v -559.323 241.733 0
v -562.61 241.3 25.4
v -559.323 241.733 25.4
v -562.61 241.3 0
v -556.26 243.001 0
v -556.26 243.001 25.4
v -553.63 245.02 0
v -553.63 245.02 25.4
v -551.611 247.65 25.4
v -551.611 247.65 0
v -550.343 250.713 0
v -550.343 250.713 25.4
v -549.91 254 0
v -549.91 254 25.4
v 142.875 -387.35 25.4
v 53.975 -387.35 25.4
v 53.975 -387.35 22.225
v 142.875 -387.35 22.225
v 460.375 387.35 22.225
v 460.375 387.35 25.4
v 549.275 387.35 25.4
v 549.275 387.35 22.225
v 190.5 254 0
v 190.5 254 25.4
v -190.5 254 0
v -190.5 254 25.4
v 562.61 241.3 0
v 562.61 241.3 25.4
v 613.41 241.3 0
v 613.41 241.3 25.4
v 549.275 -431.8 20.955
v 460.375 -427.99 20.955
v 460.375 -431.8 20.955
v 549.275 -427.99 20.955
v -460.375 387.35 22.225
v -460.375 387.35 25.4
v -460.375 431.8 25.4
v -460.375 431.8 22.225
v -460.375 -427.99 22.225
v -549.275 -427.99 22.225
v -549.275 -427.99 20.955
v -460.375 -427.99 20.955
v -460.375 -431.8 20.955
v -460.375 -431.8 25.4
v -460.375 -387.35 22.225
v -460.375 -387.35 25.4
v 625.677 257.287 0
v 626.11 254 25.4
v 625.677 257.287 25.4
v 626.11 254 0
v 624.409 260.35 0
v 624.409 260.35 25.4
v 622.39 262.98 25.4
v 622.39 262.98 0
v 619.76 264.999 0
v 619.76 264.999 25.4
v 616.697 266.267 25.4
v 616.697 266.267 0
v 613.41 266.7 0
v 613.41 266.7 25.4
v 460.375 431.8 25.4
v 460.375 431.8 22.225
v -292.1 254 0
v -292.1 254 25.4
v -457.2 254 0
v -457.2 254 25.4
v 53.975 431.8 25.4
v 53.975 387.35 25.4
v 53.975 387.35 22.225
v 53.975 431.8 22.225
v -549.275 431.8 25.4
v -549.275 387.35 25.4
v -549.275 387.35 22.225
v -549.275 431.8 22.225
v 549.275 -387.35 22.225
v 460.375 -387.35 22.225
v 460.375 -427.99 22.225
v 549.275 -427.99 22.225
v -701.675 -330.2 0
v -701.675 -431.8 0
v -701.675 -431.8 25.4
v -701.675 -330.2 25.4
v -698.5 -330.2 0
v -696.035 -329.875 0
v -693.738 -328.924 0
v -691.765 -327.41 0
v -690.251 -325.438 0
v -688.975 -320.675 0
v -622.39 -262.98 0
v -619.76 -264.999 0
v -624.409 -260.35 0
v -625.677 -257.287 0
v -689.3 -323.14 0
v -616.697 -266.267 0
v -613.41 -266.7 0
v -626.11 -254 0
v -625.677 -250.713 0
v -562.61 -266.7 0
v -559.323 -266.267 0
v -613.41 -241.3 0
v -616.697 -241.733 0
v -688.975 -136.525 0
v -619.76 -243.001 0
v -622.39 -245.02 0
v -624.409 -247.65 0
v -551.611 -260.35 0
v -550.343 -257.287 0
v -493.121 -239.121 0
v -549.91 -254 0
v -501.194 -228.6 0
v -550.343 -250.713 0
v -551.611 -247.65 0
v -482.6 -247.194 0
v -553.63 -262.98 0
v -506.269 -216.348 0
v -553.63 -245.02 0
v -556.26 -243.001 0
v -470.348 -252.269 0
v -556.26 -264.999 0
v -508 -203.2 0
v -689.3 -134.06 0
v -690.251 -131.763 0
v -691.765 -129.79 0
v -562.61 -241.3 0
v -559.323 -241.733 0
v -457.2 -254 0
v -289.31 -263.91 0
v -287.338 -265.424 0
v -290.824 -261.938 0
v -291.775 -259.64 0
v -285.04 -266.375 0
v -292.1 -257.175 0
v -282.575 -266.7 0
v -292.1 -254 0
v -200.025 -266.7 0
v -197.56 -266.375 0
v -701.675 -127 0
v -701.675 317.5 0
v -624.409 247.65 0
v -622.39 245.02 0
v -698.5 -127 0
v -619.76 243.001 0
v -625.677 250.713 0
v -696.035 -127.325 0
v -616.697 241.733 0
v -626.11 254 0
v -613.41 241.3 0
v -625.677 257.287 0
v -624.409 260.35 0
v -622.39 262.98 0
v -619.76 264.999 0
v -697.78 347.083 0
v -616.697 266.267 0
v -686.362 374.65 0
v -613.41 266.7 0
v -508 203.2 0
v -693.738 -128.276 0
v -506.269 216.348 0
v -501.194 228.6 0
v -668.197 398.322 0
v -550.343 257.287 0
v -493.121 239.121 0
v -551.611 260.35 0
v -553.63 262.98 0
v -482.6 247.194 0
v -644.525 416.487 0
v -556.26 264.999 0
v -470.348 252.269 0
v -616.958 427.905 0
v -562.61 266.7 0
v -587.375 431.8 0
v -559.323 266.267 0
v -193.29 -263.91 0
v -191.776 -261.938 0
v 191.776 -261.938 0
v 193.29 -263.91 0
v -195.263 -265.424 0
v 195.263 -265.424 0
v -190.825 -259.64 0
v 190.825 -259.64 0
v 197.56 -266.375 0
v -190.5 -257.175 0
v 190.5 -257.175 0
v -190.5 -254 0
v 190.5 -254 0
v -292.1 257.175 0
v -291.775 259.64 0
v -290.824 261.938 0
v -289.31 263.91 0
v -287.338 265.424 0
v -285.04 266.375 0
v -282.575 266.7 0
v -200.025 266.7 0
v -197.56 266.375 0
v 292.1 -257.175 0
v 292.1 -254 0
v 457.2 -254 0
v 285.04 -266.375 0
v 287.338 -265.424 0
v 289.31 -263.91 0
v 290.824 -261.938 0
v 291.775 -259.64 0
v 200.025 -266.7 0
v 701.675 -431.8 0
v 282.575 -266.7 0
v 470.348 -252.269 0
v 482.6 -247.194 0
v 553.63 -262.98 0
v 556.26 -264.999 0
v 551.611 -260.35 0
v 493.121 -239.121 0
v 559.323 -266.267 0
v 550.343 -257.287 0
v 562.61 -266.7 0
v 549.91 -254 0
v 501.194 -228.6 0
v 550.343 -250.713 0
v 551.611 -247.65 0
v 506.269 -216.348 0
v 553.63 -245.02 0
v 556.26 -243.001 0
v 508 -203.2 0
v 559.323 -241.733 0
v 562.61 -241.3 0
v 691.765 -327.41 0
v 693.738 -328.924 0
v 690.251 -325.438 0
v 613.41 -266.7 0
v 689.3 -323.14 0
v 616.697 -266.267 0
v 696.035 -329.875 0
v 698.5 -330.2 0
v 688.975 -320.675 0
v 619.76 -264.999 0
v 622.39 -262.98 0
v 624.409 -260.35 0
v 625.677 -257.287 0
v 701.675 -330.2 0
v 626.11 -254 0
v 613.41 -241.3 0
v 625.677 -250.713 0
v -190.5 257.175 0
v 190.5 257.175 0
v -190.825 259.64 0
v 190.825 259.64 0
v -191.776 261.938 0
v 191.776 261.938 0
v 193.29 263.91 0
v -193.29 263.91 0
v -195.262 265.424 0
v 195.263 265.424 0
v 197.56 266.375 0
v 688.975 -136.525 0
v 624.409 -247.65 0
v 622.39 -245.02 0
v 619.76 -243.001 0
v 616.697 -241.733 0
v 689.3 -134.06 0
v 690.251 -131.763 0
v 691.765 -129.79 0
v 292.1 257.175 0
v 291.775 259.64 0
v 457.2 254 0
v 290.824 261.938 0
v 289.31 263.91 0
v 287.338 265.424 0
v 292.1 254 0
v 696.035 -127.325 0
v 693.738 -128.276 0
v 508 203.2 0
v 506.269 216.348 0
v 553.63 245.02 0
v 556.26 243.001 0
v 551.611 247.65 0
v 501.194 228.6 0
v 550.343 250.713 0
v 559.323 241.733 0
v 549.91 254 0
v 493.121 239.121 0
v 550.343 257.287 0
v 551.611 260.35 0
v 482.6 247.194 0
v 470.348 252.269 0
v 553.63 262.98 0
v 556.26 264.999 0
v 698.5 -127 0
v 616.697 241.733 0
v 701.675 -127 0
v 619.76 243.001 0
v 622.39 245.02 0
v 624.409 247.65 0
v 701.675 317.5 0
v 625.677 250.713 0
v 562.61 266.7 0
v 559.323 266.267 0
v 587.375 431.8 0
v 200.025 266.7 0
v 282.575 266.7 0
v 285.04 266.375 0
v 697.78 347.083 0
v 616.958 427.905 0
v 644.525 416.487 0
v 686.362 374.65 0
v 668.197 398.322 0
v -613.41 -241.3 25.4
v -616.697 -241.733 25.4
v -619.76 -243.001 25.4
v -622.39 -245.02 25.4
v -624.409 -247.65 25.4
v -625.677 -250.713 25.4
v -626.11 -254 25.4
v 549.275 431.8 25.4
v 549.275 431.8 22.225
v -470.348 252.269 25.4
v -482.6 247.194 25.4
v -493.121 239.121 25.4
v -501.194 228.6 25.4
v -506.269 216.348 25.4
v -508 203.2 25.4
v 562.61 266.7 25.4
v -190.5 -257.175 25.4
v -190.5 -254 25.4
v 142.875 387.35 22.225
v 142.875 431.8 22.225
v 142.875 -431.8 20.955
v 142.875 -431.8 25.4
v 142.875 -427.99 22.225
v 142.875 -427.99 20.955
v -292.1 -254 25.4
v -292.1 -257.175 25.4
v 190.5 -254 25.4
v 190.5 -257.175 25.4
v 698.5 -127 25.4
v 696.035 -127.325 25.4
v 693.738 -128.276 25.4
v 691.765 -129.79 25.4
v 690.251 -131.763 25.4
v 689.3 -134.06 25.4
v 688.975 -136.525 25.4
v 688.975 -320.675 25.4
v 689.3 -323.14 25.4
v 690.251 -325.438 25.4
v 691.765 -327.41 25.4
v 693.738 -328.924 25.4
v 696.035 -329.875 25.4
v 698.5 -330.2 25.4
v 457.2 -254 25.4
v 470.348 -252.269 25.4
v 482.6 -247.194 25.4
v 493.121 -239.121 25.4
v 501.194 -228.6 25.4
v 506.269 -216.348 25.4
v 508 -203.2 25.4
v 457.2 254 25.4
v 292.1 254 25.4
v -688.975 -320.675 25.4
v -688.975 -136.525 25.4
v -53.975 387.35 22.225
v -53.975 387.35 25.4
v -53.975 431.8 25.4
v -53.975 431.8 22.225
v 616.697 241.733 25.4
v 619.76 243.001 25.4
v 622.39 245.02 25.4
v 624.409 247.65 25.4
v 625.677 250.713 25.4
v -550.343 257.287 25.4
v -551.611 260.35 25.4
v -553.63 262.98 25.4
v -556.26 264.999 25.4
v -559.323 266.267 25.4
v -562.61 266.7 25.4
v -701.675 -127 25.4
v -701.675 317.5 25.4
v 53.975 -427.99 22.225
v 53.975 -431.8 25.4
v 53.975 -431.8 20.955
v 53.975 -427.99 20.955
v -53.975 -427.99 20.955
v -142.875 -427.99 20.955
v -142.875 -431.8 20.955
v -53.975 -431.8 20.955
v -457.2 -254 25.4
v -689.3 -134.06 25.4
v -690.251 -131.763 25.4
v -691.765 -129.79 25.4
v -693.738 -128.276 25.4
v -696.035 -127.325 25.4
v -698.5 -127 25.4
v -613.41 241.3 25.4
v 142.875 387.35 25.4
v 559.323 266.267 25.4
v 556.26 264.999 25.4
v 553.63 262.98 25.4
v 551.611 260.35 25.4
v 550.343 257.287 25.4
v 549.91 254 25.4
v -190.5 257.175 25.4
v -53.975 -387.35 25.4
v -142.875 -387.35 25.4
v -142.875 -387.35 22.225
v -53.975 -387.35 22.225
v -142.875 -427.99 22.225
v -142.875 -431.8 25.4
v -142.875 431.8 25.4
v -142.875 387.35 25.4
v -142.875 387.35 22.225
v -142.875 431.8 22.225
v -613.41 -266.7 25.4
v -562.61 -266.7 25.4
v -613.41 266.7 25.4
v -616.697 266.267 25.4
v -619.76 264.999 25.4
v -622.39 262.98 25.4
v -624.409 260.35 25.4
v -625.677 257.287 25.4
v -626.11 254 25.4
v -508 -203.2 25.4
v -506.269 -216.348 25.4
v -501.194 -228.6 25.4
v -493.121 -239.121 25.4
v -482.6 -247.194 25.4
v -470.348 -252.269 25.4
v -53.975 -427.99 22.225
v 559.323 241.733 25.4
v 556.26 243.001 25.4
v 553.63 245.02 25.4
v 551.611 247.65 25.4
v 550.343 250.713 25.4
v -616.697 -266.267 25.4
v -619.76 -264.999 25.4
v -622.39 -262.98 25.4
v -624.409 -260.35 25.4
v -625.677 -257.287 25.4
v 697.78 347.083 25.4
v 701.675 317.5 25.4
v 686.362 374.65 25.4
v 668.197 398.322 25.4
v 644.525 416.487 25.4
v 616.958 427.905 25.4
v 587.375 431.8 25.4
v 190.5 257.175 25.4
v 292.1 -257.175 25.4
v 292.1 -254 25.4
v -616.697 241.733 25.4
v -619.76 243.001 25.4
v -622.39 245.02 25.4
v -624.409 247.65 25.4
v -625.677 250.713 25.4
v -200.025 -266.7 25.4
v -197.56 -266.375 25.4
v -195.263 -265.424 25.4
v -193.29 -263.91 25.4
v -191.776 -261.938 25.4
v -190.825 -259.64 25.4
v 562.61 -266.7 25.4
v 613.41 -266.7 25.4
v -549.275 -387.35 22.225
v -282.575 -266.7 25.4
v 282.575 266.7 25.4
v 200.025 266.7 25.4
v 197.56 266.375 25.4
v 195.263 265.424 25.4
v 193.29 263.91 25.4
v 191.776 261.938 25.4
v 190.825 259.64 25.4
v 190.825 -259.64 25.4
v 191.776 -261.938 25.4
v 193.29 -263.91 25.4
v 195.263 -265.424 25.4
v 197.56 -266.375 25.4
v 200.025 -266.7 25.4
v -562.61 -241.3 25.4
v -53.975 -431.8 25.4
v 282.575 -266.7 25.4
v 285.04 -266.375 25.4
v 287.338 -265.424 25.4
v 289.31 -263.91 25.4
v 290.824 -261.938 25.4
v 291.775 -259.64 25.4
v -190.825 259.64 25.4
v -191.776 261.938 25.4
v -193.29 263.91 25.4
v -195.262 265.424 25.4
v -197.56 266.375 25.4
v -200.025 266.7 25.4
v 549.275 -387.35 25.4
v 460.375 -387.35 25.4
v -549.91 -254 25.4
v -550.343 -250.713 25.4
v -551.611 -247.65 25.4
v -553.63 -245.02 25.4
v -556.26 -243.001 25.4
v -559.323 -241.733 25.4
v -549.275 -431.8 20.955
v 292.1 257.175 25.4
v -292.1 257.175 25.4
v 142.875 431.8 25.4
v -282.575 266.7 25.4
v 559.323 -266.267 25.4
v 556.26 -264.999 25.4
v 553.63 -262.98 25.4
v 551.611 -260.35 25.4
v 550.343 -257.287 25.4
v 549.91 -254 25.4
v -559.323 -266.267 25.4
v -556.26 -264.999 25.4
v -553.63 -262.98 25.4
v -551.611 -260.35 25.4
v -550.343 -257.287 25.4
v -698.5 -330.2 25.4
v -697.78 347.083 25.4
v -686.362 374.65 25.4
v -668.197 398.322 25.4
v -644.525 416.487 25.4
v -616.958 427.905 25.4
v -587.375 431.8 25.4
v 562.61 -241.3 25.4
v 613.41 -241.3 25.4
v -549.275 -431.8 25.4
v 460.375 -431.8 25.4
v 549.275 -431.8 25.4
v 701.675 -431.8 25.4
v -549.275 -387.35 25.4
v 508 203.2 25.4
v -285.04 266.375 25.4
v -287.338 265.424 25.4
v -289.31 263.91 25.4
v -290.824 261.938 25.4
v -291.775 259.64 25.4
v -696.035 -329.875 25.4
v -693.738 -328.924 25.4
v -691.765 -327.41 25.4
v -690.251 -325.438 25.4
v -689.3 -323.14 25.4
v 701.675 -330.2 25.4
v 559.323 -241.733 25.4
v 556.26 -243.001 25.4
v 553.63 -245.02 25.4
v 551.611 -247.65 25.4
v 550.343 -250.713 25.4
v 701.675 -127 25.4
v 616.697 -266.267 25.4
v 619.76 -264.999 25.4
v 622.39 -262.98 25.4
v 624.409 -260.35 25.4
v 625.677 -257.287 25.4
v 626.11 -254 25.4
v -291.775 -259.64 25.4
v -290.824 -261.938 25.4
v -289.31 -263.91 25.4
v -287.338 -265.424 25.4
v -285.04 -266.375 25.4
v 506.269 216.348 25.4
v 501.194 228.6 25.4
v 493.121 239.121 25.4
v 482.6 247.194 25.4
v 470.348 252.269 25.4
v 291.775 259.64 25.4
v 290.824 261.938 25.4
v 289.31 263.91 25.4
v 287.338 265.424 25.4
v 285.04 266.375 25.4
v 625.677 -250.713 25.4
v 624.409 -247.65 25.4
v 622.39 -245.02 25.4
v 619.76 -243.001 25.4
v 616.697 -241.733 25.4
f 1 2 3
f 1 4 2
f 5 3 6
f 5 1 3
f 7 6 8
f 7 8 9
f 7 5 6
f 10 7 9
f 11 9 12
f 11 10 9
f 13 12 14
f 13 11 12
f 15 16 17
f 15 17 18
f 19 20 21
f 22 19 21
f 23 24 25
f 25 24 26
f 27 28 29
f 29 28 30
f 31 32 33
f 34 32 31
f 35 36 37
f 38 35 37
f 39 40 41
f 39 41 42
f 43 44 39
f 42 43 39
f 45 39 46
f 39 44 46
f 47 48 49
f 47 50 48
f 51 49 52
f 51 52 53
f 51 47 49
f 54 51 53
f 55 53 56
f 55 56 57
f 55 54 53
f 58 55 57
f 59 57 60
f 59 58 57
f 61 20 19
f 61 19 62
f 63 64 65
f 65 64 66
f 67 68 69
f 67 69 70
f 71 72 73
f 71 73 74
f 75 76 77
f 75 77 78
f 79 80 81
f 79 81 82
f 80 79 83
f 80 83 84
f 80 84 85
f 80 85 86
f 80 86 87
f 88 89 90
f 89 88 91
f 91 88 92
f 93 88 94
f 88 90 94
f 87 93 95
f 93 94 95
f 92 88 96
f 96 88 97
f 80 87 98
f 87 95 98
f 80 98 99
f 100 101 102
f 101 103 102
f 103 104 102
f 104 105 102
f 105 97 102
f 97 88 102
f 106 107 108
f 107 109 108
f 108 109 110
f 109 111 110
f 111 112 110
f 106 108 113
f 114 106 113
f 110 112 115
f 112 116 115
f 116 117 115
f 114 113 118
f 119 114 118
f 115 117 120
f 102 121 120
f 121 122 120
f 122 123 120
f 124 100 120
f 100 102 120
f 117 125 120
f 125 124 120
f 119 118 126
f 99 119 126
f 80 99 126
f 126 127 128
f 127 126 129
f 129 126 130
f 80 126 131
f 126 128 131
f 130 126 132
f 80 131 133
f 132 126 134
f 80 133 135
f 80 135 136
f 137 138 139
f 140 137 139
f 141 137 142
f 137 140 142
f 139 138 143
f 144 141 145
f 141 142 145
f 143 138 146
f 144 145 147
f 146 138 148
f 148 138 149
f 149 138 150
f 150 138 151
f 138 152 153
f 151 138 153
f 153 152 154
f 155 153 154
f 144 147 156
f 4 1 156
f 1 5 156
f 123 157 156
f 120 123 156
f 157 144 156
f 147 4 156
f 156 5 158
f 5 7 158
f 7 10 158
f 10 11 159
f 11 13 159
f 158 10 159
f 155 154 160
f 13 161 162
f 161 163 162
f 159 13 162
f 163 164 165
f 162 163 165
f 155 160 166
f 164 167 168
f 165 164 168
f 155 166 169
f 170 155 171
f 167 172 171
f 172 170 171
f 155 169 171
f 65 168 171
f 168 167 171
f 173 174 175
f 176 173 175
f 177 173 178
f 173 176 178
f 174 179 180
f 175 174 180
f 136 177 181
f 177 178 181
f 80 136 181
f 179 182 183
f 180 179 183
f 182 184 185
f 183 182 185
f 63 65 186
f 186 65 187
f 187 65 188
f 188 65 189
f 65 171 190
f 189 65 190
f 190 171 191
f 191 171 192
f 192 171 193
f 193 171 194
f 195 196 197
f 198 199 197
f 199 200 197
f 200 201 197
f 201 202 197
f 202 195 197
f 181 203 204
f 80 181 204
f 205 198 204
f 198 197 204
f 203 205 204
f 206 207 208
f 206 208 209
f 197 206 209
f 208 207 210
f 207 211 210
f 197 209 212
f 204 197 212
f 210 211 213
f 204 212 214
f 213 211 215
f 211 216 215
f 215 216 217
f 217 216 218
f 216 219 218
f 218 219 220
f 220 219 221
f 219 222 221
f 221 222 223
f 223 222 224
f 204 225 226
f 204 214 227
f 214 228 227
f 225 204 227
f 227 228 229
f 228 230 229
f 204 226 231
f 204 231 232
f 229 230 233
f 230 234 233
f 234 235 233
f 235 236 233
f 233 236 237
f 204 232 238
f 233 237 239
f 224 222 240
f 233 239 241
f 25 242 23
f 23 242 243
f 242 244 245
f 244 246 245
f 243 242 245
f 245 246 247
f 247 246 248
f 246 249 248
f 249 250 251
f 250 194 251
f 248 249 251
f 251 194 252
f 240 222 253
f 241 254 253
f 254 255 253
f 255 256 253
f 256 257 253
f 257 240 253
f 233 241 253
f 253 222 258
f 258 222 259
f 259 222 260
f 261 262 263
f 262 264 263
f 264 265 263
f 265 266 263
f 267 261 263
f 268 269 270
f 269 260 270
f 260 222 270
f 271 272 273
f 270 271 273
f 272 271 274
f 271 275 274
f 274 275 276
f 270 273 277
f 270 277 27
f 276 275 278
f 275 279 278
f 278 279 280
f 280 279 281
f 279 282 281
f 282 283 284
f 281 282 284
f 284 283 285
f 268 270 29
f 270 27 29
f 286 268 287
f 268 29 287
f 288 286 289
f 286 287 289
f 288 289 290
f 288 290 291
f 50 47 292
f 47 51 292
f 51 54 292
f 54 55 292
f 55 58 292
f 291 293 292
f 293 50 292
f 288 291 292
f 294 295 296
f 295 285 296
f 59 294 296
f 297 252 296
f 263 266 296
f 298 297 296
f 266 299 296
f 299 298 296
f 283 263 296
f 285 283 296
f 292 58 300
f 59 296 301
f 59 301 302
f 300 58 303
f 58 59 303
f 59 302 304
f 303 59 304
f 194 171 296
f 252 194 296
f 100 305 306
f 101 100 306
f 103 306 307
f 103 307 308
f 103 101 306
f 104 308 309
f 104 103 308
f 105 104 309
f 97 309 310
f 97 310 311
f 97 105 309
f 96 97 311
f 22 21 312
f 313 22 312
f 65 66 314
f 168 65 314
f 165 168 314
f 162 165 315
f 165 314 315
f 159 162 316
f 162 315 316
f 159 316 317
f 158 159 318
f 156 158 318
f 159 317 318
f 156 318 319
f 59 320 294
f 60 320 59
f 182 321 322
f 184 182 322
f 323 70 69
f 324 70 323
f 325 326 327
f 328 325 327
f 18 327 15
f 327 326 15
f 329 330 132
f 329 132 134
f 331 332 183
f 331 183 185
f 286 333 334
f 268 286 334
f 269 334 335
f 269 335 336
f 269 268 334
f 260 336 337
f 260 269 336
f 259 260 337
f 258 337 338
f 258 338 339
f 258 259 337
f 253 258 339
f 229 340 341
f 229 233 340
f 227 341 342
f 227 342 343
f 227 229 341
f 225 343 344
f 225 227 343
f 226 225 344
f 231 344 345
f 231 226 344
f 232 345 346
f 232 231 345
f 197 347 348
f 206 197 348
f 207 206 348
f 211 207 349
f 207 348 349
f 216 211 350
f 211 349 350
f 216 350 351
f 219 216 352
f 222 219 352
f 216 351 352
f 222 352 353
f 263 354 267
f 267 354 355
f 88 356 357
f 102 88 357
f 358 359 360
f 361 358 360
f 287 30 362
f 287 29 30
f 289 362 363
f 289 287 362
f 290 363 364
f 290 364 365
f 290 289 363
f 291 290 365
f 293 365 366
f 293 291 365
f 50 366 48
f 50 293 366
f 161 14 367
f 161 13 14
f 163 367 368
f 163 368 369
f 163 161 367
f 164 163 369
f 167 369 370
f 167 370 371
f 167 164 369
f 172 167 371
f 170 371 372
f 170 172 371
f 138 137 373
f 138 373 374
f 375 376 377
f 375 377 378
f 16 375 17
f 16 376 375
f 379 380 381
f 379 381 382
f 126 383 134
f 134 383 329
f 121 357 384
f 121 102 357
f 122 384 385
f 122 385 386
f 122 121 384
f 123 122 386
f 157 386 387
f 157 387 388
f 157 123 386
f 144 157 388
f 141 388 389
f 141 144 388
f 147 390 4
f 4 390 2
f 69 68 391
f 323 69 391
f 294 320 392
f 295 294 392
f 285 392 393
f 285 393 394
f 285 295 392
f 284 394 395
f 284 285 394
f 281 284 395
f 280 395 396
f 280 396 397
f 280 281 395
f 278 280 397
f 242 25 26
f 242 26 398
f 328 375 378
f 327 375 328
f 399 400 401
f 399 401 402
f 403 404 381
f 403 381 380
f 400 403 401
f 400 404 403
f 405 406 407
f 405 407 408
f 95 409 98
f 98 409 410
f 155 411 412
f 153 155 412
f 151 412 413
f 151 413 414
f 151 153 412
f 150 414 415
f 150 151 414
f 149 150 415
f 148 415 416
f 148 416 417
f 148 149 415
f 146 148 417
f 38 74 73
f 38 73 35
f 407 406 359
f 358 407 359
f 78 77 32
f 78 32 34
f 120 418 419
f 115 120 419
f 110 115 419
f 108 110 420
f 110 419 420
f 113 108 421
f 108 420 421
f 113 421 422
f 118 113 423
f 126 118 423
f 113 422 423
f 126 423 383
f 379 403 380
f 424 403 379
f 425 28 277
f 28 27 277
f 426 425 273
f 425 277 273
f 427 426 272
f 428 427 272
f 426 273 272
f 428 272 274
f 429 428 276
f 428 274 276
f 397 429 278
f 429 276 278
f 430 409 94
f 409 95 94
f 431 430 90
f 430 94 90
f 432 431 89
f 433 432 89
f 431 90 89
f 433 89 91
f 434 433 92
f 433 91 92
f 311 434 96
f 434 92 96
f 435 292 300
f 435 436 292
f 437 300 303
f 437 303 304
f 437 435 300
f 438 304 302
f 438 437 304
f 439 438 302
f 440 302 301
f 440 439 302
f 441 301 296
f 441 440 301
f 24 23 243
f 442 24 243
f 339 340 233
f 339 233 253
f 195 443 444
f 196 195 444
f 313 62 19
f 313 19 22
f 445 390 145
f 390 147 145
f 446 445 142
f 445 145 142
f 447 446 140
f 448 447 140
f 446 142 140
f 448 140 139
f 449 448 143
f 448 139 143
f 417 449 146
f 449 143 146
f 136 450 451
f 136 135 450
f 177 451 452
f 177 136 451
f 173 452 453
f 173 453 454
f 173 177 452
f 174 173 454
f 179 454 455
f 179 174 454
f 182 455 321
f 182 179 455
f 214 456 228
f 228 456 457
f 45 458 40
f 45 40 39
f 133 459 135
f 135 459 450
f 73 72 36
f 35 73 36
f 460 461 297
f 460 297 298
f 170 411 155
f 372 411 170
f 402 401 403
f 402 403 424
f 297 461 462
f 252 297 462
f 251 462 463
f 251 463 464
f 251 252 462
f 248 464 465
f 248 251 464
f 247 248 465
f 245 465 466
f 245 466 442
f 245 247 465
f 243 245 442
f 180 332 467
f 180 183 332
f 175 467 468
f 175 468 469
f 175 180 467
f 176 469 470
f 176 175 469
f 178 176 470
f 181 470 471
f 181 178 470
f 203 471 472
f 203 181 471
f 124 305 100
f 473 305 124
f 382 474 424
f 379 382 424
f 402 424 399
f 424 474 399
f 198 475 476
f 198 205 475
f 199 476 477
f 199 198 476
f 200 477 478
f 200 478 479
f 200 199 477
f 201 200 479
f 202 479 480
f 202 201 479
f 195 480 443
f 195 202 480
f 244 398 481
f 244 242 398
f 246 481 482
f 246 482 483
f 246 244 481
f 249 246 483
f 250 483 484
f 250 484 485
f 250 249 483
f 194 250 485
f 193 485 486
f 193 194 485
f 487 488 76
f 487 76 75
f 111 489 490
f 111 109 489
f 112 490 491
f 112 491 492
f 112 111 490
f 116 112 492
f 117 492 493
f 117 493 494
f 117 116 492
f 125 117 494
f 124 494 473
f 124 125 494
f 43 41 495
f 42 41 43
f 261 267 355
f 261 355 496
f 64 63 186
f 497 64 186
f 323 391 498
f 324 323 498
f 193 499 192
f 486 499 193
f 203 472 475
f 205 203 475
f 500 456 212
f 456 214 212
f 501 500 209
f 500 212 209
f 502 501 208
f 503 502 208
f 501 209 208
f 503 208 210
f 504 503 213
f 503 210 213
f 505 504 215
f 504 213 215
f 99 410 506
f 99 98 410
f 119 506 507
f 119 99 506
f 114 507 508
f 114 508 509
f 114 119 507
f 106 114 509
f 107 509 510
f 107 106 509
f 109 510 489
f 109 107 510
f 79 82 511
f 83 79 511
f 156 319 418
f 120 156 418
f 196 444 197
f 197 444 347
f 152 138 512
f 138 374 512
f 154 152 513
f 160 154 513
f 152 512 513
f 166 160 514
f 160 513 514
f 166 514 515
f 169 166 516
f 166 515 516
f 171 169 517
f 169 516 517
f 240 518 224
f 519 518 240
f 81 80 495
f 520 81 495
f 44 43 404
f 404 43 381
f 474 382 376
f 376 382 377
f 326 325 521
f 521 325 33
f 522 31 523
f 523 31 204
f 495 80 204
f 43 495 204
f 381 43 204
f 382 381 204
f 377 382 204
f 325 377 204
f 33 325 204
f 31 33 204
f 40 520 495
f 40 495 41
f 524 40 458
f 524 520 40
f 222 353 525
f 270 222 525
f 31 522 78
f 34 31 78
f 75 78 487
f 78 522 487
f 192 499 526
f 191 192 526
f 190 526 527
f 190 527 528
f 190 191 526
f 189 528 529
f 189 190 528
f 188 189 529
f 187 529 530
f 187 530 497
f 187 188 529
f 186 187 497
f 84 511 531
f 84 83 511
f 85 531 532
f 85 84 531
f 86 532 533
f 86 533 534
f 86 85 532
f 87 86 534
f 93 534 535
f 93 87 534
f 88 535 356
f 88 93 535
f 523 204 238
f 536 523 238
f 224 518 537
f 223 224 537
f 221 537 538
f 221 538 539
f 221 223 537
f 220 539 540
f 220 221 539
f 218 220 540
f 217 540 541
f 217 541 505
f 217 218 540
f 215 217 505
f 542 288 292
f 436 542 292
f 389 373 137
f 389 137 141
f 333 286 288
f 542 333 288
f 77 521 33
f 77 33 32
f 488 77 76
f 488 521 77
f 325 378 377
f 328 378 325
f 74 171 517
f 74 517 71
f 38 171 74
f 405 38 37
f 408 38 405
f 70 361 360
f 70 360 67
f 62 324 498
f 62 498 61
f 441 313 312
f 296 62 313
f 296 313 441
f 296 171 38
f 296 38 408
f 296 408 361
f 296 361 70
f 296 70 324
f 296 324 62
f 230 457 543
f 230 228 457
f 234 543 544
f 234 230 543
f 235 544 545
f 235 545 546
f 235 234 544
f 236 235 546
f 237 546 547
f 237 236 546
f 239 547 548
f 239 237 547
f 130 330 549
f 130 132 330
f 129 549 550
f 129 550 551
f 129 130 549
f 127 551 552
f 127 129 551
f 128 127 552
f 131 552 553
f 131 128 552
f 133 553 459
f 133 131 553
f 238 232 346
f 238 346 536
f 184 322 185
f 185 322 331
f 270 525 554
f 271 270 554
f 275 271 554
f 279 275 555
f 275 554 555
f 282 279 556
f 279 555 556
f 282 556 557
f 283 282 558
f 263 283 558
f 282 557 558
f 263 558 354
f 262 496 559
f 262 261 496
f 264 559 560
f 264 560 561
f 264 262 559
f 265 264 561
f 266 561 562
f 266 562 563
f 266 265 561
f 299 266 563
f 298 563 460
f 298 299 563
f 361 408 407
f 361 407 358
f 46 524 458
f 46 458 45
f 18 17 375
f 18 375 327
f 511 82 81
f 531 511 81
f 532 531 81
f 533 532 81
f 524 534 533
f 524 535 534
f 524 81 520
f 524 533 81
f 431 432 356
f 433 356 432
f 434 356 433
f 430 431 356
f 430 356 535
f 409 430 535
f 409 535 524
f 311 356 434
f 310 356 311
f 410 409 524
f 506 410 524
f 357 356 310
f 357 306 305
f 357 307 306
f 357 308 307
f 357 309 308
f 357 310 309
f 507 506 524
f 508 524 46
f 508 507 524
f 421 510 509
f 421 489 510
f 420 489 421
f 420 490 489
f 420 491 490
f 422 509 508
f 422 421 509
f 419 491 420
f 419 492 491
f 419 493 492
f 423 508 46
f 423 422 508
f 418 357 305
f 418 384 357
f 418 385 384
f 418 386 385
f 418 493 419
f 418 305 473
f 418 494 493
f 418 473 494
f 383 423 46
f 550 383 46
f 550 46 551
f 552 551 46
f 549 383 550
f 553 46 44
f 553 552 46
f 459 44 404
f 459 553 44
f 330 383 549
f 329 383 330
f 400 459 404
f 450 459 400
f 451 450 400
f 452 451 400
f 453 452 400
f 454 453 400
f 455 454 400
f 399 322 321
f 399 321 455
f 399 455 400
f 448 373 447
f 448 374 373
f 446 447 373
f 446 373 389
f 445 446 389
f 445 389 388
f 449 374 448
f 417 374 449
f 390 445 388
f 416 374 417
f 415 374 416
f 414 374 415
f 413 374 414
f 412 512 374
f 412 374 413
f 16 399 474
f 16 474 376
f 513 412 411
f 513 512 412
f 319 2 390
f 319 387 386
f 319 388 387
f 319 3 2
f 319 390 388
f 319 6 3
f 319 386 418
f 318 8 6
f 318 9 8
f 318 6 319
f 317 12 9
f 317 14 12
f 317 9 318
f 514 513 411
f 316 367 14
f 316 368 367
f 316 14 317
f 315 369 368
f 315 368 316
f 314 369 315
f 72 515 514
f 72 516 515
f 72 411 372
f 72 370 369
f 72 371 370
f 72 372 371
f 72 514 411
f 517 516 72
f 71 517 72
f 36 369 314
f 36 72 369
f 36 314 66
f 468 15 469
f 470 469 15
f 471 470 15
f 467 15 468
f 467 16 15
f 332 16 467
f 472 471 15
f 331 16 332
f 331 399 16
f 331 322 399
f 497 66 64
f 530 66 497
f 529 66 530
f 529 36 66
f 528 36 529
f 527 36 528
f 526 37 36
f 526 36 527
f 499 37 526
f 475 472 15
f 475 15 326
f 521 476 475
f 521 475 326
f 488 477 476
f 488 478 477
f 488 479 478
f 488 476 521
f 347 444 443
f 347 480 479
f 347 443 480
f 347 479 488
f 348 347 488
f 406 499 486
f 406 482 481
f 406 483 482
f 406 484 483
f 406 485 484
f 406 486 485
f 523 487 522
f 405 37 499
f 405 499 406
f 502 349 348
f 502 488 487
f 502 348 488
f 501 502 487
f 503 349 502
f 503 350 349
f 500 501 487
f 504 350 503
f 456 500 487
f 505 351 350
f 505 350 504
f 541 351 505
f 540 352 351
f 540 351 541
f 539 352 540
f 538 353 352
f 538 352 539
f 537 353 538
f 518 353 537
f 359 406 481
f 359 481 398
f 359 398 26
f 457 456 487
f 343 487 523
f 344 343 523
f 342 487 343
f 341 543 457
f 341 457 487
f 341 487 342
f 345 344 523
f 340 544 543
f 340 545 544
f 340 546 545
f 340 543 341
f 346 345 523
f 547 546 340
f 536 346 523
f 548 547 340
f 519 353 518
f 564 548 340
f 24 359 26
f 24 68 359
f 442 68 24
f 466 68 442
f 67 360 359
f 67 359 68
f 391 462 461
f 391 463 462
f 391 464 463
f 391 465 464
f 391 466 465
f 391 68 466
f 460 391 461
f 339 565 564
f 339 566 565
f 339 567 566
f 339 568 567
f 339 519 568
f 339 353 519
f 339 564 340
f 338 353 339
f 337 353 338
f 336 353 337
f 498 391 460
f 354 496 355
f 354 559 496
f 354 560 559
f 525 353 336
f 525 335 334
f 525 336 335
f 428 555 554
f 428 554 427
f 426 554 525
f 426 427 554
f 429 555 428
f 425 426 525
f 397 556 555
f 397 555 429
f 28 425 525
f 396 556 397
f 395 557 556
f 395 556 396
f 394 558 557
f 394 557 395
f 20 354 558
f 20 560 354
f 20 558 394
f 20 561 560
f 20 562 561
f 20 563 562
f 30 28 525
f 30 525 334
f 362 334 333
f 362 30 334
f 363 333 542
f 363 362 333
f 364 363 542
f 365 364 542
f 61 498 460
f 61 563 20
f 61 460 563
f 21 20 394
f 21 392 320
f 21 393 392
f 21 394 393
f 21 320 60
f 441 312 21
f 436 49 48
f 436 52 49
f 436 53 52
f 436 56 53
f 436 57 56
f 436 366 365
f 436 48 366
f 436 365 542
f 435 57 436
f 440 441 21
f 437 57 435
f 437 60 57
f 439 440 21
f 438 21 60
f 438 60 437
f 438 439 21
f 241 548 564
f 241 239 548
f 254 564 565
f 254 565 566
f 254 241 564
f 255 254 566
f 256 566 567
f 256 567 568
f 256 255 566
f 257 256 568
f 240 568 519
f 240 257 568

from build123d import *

# Parameters (mm, degrees)
F0_W      = 1403.35
F0_H      = 863.6
F1_DEPTH  = 25.4
F3_DEPTH  = 25.4
F4_W      = 88.9
F4_H      = 44.45
F5_DEPTH  = 3.175
F6_W      = 88.9
F6_H      = 3.81
F7_DEPTH  = 4.445
F8_R      = 114.3
F9_W      = 88.9
F9_H      = 44.45
F10_DEPTH = 3.175
F11_W     = 12.7
F11_H     = 203.2
F12_DEPTH = 25.401
F13_R     = 9.525
F14_W     = 101.6
F14_H     = 12.7
F15_DEPTH = 25.401
F16_R     = 9.525
F17_W     = 76.2
F17_H     = 25.4
F18_DEPTH = 25.401
F19_R     = 12.69999


# Not quite as in the source:
# - a fillet or chamfer is up to 0.001 mm smaller than in the source, because OpenCascade refuses the exact size


with BuildPart() as f1:
    # F0 (on Top) → F1 (new body)
    with BuildSketch(Plane.XY):
        Rectangle(F0_W, F0_H)
    extrude(amount=F1_DEPTH)

    # F2 (on face) → F3 (cut)
    with BuildSketch(Plane.XY.offset(25.4)):
        with BuildLine():
            Line((457.2, 254), (-457.2, 254))
            ThreePointArc((-457.2, 254), (-493.1210244843, 239.1210244843), (-508, 203.2))
            Line((-508, 203.2), (-508, -203.2))
            ThreePointArc((-508, -203.2), (-493.1210244843, -239.1210244843), (-457.2, -254))
            Line((-457.2, -254), (457.2, -254))
            ThreePointArc((457.2, -254), (493.1210244843, -239.1210244843), (508, -203.2))
            Line((508, -203.2), (508, 203.2))
            ThreePointArc((508, 203.2), (493.1210244843, 239.1210244843), (457.2, 254))
        make_face()
    extrude(amount=-F3_DEPTH, mode=Mode.SUBTRACT)

    # F4 (on face) → F5 (cut)
    with BuildSketch(Plane.XY.offset(25.4)):
        with Locations((-504.825, -409.575)):
            Rectangle(F4_W, F4_H)
        with Locations((-98.425, -409.575)):
            Rectangle(F4_W, F4_H)
        with Locations((98.425, -409.575)):
            Rectangle(F4_W, F4_H)
        with Locations((504.825, -409.575)):
            Rectangle(F4_W, F4_H)
    extrude(amount=-F5_DEPTH, mode=Mode.SUBTRACT)

    # F6 (on face) → F7 (cut)
    with BuildSketch(Plane.XY.offset(25.4)):
        with Locations((-504.825, -429.895)):
            Rectangle(F6_W, F6_H)
        with Locations((-98.425, -429.895)):
            Rectangle(F6_W, F6_H)
        with Locations((98.425, -429.895)):
            Rectangle(F6_W, F6_H)
        with Locations((504.825, -429.895)):
            Rectangle(F6_W, F6_H)
    extrude(amount=-F7_DEPTH, mode=Mode.SUBTRACT)

    # F8
    f8_edges = [f1.edges().sort_by_distance(p)[0] for p in [
        (701.675, 431.8, 12.7),
        (-701.675, 431.8, 12.7),
    ]]
    fillet(f8_edges, radius=F8_R)

    # F9 (on face) → F10 (cut)
    with BuildSketch(Plane.XY.offset(25.4)):
        with Locations((98.425, 409.575)):
            Rectangle(F9_W, F9_H)
        with Locations((504.825, 409.575)):
            Rectangle(F9_W, F9_H)
        with Locations((-98.425, 409.575)):
            Rectangle(F9_W, F9_H)
        with Locations((-504.825, 409.575)):
            Rectangle(F9_W, F9_H)
    extrude(amount=-F10_DEPTH, mode=Mode.SUBTRACT)

    # F11 (on face) → F12 (cut, through all)
    with BuildSketch(Plane.XY.offset(25.4)):
        with Locations((-695.325, -228.6)):
            Rectangle(F11_W, F11_H)
        with Locations((695.325, -228.6)):
            Rectangle(F11_W, F11_H)
    extrude(amount=-F12_DEPTH, mode=Mode.SUBTRACT)

    # F13
    f13_edges = [f1.edges().sort_by_distance(p)[0] for p in [
        (-688.975, -127, 12.7),
        (-688.975, -330.2, 12.7),
        (688.975, -127, 12.7),
        (688.975, -330.2, 12.7),
    ]]
    fillet(f13_edges, radius=F13_R)

    # F14 (on face) → F15 (cut, through all)
    with BuildSketch(Plane.XY.offset(25.4)):
        with Locations((-241.3, -260.35)):
            Rectangle(F14_W, F14_H)
        with Locations((241.3, -260.35)):
            Rectangle(F14_W, F14_H)
        with Locations((-241.3, 260.35)):
            Rectangle(F14_W, F14_H)
        with Locations((241.3, 260.35)):
            Rectangle(F14_W, F14_H)
    extrude(amount=-F15_DEPTH, mode=Mode.SUBTRACT)

    # F16
    f16_edges = [f1.edges().sort_by_distance(p)[0] for p in [
        (-292.1, -266.7, 12.7),
        (190.5, -266.7, 12.7),
        (292.1, -266.7, 12.7),
        (-190.5, -266.7, 12.7),
        (190.5, 266.7, 12.7),
        (-292.1, 266.7, 12.7),
        (-190.5, 266.7, 12.7),
        (292.1, 266.7, 12.7),
    ]]
    fillet(f16_edges, radius=F16_R)

    # F17 (on face) → F18 (cut, through all)
    with BuildSketch(Plane.XY.offset(25.4)):
        with Locations((-588.01, 254)):
            Rectangle(F17_W, F17_H)
        with Locations((588.01, 254)):
            Rectangle(F17_W, F17_H)
        with Locations((588.01, -254)):
            Rectangle(F17_W, F17_H)
        with Locations((-588.01, -254)):
            Rectangle(F17_W, F17_H)
    extrude(amount=-F18_DEPTH, mode=Mode.SUBTRACT)

    # F19 (radius 12.7 in the source; OpenCascade refuses exactly that, so slightly less here)
    f19_edges = [f1.edges().sort_by_distance(p)[0] for p in [
        (-626.11, 241.3, 12.7),
        (-549.91, 241.3, 12.7),
        (-549.91, 266.7, 12.7),
        (-626.11, 266.7, 12.7),
        (-626.11, -241.3, 12.7),
        (-626.11, -266.7, 12.7),
        (-549.91, -266.7, 12.7),
        (-549.91, -241.3, 12.7),
        (626.11, -241.3, 12.7),
        (626.11, -266.7, 12.7),
        (549.91, -266.7, 12.7),
        (549.91, -241.3, 12.7),
        (549.91, 266.7, 12.7),
        (549.91, 241.3, 12.7),
        (626.11, 241.3, 12.7),
        (626.11, 266.7, 12.7),
    ]]
    fillet(f19_edges, radius=F19_R)


solid = f1.part
